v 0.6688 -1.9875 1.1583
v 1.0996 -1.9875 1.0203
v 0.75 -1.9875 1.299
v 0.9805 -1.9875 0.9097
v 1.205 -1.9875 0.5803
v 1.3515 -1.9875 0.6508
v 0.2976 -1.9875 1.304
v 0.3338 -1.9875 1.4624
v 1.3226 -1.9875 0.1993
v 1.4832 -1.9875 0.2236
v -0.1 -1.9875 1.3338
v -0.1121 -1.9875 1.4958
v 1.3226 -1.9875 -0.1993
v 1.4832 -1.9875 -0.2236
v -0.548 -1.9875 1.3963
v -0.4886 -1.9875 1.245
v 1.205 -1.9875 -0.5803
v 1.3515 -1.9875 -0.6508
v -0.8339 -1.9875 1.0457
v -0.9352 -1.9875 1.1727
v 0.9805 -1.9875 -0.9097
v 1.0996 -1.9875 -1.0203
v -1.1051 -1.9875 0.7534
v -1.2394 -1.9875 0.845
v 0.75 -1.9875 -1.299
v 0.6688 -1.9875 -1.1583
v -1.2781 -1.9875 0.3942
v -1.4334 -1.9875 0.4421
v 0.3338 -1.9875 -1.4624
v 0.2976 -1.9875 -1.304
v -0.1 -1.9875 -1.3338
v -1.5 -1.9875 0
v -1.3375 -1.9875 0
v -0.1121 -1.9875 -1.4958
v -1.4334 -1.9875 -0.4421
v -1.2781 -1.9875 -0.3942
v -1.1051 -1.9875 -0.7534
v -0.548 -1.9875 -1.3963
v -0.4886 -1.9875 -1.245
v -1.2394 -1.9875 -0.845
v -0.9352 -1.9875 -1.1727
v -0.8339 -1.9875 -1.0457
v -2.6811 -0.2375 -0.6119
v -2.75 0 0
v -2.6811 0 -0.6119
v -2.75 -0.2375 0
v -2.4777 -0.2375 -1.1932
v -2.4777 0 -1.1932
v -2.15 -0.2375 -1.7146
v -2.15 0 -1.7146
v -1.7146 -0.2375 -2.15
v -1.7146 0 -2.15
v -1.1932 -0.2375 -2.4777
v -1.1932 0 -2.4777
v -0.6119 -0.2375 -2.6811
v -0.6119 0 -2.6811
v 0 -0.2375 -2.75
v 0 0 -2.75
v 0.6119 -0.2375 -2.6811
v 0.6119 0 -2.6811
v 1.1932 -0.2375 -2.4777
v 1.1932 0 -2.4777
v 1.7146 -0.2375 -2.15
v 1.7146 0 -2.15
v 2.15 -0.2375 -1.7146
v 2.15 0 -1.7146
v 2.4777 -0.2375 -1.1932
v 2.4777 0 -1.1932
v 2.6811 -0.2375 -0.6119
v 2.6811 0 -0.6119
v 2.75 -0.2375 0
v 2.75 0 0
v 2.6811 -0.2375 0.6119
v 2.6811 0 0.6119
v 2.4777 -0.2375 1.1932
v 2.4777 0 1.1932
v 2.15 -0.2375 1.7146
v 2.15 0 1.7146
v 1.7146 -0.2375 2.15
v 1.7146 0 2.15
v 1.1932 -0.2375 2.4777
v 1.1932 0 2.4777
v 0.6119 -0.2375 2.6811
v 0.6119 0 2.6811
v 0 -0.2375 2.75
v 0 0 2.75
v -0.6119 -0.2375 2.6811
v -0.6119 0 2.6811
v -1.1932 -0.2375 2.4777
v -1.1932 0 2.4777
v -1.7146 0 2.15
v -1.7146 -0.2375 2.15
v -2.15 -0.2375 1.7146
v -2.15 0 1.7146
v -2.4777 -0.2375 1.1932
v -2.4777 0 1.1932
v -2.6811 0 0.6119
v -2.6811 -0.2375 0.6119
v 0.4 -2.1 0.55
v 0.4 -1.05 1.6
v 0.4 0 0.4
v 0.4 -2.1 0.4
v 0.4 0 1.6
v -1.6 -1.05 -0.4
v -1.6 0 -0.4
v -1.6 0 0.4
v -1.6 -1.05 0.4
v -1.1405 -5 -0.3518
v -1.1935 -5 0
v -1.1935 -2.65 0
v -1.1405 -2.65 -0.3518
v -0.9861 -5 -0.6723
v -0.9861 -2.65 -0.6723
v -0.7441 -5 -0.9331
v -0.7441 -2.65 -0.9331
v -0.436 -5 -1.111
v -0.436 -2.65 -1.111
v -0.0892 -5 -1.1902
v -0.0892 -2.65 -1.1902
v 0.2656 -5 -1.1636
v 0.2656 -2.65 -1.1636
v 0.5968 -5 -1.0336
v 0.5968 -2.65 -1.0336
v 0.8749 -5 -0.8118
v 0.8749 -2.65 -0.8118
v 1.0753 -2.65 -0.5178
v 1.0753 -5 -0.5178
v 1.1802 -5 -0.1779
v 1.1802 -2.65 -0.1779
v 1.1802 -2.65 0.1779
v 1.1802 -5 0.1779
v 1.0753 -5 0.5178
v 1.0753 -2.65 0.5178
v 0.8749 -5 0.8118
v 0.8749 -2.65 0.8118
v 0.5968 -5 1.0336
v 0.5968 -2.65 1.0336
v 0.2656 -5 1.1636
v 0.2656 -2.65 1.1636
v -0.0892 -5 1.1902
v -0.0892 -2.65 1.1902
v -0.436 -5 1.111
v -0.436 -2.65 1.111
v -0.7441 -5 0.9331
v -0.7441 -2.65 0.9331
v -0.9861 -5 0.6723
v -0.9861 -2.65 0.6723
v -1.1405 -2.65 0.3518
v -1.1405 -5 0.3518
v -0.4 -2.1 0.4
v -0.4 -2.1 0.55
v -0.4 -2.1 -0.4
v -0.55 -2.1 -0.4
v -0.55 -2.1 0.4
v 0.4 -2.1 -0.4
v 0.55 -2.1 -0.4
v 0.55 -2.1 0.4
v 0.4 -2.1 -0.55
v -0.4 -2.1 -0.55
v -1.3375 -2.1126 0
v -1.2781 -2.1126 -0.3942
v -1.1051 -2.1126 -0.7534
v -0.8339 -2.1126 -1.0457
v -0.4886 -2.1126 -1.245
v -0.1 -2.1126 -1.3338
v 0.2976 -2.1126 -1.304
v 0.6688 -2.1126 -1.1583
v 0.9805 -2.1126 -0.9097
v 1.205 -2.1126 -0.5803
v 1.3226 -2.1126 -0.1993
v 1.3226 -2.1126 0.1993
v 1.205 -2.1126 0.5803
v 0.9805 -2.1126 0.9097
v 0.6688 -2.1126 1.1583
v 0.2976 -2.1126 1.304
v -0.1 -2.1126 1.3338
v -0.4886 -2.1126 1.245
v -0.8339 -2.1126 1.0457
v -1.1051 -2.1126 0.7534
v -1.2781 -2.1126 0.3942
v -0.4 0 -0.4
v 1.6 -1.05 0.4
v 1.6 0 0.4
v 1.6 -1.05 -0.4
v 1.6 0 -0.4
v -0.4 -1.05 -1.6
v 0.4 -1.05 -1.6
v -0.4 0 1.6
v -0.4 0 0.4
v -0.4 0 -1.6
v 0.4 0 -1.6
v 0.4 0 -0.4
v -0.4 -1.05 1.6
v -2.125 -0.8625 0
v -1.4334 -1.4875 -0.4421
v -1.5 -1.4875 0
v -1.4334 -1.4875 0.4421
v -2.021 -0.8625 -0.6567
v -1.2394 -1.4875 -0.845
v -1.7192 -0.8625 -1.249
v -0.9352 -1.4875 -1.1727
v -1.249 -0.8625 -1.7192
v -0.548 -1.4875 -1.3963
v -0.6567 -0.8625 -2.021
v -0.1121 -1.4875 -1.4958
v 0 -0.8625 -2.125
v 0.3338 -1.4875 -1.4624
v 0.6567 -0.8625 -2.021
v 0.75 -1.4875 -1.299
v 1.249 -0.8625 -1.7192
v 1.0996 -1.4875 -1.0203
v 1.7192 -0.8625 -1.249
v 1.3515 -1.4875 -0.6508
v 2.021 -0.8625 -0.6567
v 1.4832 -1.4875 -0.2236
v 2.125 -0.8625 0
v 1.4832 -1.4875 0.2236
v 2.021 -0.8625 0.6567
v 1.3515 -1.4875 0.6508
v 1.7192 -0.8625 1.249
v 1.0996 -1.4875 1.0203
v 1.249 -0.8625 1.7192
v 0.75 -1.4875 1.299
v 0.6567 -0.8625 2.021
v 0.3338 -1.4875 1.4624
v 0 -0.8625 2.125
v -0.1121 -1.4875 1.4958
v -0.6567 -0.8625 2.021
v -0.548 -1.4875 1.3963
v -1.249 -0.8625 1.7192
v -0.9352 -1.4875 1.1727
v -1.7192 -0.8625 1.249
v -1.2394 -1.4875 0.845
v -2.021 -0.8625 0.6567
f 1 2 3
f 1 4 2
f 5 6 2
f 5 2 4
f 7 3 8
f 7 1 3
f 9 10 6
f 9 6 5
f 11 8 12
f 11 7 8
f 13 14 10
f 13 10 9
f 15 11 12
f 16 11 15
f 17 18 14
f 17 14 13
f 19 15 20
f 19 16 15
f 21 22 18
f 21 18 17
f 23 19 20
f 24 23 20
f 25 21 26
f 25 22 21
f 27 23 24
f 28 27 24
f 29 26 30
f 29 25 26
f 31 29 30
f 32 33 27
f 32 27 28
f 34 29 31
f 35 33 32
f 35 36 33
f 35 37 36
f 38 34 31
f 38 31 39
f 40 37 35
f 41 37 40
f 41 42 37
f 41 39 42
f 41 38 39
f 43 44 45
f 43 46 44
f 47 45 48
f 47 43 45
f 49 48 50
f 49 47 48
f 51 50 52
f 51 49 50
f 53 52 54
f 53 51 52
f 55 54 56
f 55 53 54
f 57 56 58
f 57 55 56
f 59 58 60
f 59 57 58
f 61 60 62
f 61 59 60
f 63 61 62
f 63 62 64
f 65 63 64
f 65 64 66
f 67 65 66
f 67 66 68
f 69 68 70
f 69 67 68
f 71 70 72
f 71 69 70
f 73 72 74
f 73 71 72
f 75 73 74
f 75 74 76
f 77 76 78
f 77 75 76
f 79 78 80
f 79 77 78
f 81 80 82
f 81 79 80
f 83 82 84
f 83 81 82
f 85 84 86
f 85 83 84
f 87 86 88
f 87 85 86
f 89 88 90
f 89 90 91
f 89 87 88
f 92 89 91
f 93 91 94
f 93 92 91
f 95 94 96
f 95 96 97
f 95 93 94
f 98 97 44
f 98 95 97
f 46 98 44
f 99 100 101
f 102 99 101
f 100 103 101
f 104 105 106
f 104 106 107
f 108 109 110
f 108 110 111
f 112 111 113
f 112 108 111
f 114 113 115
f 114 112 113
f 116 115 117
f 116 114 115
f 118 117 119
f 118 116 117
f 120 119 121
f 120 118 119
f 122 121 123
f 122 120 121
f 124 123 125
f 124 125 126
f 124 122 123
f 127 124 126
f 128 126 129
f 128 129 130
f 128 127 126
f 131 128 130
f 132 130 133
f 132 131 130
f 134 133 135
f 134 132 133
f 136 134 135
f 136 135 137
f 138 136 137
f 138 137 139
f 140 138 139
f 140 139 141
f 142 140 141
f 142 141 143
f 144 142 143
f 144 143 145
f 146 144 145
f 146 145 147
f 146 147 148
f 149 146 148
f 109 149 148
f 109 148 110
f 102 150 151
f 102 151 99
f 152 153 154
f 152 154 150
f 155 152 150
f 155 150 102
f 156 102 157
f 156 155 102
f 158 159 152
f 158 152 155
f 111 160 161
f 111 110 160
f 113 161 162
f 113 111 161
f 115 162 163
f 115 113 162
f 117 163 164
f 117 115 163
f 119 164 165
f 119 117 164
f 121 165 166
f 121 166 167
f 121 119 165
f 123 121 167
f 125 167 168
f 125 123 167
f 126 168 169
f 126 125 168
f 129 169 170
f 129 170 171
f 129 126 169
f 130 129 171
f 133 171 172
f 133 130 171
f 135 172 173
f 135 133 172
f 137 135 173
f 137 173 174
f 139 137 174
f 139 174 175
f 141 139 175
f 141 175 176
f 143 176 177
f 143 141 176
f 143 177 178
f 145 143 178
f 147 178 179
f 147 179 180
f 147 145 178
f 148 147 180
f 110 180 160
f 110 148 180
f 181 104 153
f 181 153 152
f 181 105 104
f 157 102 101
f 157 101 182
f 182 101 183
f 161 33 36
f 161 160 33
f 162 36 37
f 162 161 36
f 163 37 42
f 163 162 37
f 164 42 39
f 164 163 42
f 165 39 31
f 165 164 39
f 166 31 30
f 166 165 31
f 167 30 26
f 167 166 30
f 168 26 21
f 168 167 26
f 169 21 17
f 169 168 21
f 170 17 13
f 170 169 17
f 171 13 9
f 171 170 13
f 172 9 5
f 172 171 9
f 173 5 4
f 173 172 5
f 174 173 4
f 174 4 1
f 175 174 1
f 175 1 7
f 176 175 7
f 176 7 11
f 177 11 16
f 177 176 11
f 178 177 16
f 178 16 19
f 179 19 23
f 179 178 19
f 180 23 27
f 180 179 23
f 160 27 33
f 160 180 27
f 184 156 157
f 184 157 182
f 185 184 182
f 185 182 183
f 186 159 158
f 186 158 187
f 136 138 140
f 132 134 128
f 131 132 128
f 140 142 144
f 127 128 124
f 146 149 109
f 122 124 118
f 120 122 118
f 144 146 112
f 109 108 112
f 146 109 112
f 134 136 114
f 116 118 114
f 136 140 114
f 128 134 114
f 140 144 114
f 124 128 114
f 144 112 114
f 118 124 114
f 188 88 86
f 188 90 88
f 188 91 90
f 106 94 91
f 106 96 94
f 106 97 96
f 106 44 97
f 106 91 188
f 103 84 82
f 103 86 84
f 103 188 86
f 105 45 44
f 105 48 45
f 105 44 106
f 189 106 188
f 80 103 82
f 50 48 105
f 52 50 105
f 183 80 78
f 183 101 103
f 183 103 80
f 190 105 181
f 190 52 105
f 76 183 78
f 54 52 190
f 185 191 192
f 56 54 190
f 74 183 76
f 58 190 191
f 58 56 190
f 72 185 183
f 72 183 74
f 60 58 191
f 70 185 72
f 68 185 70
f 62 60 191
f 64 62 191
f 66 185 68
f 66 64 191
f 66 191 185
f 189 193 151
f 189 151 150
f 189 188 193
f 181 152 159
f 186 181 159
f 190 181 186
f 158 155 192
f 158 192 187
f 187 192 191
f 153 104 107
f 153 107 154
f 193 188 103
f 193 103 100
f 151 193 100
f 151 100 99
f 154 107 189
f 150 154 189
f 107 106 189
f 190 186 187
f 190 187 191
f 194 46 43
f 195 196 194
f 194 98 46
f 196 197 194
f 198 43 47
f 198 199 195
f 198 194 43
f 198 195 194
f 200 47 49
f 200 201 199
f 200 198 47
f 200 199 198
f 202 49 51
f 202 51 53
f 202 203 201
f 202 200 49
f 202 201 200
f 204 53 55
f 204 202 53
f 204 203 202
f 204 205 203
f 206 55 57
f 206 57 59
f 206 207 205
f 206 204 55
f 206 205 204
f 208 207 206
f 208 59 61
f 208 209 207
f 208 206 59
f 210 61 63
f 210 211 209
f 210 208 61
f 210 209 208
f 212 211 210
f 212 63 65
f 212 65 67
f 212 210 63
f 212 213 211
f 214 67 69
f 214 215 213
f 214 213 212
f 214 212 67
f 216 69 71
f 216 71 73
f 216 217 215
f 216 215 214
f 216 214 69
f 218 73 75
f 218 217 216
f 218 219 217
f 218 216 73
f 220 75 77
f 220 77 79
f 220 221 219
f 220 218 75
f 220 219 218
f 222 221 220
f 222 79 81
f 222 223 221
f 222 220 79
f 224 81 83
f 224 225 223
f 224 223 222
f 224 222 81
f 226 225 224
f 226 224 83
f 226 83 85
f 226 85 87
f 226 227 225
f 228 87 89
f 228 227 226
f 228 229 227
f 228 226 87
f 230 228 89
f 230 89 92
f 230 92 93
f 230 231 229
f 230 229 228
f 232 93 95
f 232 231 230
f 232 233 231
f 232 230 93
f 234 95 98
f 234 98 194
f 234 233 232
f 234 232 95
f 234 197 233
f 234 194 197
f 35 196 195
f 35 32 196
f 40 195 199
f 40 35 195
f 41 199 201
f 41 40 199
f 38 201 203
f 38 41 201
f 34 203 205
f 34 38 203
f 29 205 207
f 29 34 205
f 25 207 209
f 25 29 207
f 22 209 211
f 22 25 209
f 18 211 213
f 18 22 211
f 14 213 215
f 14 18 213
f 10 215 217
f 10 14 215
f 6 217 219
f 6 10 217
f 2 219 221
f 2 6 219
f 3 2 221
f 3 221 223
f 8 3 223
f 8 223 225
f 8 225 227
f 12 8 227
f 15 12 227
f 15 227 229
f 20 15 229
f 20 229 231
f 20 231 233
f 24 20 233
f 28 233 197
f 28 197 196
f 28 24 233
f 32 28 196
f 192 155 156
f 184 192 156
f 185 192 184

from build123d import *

# Parameters (mm, degrees)
KREUZSCHLITZ1_H_DEPTH      = 0.4
KREUZSCHLITZ1_H_DEPTH_BACK = 0.4
KREUZSCHLITZ2_H_DEPTH      = 0.4
KREUZSCHLITZ2_H_DEPTH_BACK = 0.4
BOSS_EXTRUDE1_START        = 2
SKETCH1_R                  = 1.1935
BOSS_EXTRUDE1_DEPTH        = 2
CUT_EXTRUDE1_DEPTH         = 2
CUT_EXTRUDE1_DEPTH_BACK    = 2
SKETCH2_W                  = 2.387
SKETCH2_H                  = 5


with BuildPart() as part:
    # Skizze1 → Basis-Rotation (revolve)
    with BuildSketch(Plane.XY, mode=Mode.PRIVATE) as basis_rotation_sk:
        Polygon((0, 0), (2.75, 0), (2.75, -0.2375), (1.5, -1.4875), (1.5, -1.9875), (1.3375, -1.9875), (1.3375, -2.112584684), (1.1935, -2.65), (1.1935, -8), (0, -8), align=None)
    revolve(basis_rotation_sk.sketch.rotate(Axis((0, 0, 0), (0, -1, 0)), 180), axis=Axis((0, 0, 0), (0, -1, 0)))

    # Skizze2 → Kreuzschlitz1 H (cut, two sides: drawn at the far end of the back side and taken through both)
    with BuildSketch(Plane.XY.offset(-KREUZSCHLITZ1_H_DEPTH_BACK)):
        Polygon((-0.55, -2.1), (0.55, -2.1), (1.6, -1.05), (1.6, 0), (-1.6, 0), (-1.6, -1.05), align=None)
    extrude(amount=KREUZSCHLITZ1_H_DEPTH + KREUZSCHLITZ1_H_DEPTH_BACK, mode=Mode.SUBTRACT)

    # Skizze3 → Kreuzschlitz2 H (cut, two sides: drawn at the far end of the back side and taken through both)
    with BuildSketch(Plane(origin=(0, 0, 0), x_dir=(0, 0, -1), z_dir=(1, 0, 0)).offset(-KREUZSCHLITZ2_H_DEPTH_BACK)):
        Polygon((-0.55, -2.1), (0.55, -2.1), (1.6, -1.05), (1.6, 0), (-1.6, 0), (-1.6, -1.05), align=None)
    extrude(amount=KREUZSCHLITZ2_H_DEPTH + KREUZSCHLITZ2_H_DEPTH_BACK, mode=Mode.SUBTRACT)

    # Sketch1 → Boss-Extrude1 (add)
    with BuildSketch(Plane.XZ.offset(8).offset(BOSS_EXTRUDE1_START)):
        with Locations(Location((0, 0, 0), (0, 0, 180))):
            Circle(SKETCH1_R)
    extrude(amount=-BOSS_EXTRUDE1_DEPTH)

    # Sketch2 → Cut-Extrude1 (cut, two sides: drawn at the far end of the back side and taken through both)
    with BuildSketch(Plane(origin=(0, 0, 0), x_dir=(0, 0, -1), z_dir=(1, 0, 0)).offset(-CUT_EXTRUDE1_DEPTH_BACK)):
        with Locations((0, -7.5)):
            Rectangle(SKETCH2_W, SKETCH2_H)
    extrude(amount=CUT_EXTRUDE1_DEPTH + CUT_EXTRUDE1_DEPTH_BACK, mode=Mode.SUBTRACT)


solid = part.part
